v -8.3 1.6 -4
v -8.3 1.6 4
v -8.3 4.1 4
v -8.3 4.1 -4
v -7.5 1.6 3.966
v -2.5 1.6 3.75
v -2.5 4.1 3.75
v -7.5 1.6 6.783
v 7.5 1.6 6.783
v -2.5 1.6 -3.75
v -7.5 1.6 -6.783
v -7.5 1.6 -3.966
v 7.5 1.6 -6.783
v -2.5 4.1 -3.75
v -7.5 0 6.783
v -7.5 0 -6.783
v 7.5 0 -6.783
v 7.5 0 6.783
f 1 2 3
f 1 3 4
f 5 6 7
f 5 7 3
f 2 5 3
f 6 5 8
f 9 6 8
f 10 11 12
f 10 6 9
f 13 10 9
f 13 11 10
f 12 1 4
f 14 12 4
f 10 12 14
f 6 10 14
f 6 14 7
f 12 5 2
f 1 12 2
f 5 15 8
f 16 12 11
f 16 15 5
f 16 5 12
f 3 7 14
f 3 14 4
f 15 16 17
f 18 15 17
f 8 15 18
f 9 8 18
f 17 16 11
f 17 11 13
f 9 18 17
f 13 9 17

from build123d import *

# Parameters (mm, degrees)
SKETCH_1_W      = 15
SKETCH_1_H      = 13.566666666
EXTRUDE_1_DEPTH = 1.6
EXTRUDE_2_DEPTH = 2.5


with BuildPart() as part:
    # 草图1 → 凸台-拉伸1 (new body)
    with BuildSketch(Plane(origin=(0, 0, 0), x_dir=(1, 0, 0), z_dir=(0, 1, 0))):
        Rectangle(SKETCH_1_W, SKETCH_1_H)
    extrude(amount=EXTRUDE_1_DEPTH)

    # 草图2 → 凸台-拉伸2 (add)
    with BuildSketch(Plane(origin=(0, 1.6, 0), x_dir=(1, 0, 0), z_dir=(0, 1, 0))):
        Polygon((-8.3, -4), (-8.3, 4), (-2.5, 3.75), (-2.5, -3.75), align=None)
    extrude(amount=EXTRUDE_2_DEPTH)


solid = part.part
